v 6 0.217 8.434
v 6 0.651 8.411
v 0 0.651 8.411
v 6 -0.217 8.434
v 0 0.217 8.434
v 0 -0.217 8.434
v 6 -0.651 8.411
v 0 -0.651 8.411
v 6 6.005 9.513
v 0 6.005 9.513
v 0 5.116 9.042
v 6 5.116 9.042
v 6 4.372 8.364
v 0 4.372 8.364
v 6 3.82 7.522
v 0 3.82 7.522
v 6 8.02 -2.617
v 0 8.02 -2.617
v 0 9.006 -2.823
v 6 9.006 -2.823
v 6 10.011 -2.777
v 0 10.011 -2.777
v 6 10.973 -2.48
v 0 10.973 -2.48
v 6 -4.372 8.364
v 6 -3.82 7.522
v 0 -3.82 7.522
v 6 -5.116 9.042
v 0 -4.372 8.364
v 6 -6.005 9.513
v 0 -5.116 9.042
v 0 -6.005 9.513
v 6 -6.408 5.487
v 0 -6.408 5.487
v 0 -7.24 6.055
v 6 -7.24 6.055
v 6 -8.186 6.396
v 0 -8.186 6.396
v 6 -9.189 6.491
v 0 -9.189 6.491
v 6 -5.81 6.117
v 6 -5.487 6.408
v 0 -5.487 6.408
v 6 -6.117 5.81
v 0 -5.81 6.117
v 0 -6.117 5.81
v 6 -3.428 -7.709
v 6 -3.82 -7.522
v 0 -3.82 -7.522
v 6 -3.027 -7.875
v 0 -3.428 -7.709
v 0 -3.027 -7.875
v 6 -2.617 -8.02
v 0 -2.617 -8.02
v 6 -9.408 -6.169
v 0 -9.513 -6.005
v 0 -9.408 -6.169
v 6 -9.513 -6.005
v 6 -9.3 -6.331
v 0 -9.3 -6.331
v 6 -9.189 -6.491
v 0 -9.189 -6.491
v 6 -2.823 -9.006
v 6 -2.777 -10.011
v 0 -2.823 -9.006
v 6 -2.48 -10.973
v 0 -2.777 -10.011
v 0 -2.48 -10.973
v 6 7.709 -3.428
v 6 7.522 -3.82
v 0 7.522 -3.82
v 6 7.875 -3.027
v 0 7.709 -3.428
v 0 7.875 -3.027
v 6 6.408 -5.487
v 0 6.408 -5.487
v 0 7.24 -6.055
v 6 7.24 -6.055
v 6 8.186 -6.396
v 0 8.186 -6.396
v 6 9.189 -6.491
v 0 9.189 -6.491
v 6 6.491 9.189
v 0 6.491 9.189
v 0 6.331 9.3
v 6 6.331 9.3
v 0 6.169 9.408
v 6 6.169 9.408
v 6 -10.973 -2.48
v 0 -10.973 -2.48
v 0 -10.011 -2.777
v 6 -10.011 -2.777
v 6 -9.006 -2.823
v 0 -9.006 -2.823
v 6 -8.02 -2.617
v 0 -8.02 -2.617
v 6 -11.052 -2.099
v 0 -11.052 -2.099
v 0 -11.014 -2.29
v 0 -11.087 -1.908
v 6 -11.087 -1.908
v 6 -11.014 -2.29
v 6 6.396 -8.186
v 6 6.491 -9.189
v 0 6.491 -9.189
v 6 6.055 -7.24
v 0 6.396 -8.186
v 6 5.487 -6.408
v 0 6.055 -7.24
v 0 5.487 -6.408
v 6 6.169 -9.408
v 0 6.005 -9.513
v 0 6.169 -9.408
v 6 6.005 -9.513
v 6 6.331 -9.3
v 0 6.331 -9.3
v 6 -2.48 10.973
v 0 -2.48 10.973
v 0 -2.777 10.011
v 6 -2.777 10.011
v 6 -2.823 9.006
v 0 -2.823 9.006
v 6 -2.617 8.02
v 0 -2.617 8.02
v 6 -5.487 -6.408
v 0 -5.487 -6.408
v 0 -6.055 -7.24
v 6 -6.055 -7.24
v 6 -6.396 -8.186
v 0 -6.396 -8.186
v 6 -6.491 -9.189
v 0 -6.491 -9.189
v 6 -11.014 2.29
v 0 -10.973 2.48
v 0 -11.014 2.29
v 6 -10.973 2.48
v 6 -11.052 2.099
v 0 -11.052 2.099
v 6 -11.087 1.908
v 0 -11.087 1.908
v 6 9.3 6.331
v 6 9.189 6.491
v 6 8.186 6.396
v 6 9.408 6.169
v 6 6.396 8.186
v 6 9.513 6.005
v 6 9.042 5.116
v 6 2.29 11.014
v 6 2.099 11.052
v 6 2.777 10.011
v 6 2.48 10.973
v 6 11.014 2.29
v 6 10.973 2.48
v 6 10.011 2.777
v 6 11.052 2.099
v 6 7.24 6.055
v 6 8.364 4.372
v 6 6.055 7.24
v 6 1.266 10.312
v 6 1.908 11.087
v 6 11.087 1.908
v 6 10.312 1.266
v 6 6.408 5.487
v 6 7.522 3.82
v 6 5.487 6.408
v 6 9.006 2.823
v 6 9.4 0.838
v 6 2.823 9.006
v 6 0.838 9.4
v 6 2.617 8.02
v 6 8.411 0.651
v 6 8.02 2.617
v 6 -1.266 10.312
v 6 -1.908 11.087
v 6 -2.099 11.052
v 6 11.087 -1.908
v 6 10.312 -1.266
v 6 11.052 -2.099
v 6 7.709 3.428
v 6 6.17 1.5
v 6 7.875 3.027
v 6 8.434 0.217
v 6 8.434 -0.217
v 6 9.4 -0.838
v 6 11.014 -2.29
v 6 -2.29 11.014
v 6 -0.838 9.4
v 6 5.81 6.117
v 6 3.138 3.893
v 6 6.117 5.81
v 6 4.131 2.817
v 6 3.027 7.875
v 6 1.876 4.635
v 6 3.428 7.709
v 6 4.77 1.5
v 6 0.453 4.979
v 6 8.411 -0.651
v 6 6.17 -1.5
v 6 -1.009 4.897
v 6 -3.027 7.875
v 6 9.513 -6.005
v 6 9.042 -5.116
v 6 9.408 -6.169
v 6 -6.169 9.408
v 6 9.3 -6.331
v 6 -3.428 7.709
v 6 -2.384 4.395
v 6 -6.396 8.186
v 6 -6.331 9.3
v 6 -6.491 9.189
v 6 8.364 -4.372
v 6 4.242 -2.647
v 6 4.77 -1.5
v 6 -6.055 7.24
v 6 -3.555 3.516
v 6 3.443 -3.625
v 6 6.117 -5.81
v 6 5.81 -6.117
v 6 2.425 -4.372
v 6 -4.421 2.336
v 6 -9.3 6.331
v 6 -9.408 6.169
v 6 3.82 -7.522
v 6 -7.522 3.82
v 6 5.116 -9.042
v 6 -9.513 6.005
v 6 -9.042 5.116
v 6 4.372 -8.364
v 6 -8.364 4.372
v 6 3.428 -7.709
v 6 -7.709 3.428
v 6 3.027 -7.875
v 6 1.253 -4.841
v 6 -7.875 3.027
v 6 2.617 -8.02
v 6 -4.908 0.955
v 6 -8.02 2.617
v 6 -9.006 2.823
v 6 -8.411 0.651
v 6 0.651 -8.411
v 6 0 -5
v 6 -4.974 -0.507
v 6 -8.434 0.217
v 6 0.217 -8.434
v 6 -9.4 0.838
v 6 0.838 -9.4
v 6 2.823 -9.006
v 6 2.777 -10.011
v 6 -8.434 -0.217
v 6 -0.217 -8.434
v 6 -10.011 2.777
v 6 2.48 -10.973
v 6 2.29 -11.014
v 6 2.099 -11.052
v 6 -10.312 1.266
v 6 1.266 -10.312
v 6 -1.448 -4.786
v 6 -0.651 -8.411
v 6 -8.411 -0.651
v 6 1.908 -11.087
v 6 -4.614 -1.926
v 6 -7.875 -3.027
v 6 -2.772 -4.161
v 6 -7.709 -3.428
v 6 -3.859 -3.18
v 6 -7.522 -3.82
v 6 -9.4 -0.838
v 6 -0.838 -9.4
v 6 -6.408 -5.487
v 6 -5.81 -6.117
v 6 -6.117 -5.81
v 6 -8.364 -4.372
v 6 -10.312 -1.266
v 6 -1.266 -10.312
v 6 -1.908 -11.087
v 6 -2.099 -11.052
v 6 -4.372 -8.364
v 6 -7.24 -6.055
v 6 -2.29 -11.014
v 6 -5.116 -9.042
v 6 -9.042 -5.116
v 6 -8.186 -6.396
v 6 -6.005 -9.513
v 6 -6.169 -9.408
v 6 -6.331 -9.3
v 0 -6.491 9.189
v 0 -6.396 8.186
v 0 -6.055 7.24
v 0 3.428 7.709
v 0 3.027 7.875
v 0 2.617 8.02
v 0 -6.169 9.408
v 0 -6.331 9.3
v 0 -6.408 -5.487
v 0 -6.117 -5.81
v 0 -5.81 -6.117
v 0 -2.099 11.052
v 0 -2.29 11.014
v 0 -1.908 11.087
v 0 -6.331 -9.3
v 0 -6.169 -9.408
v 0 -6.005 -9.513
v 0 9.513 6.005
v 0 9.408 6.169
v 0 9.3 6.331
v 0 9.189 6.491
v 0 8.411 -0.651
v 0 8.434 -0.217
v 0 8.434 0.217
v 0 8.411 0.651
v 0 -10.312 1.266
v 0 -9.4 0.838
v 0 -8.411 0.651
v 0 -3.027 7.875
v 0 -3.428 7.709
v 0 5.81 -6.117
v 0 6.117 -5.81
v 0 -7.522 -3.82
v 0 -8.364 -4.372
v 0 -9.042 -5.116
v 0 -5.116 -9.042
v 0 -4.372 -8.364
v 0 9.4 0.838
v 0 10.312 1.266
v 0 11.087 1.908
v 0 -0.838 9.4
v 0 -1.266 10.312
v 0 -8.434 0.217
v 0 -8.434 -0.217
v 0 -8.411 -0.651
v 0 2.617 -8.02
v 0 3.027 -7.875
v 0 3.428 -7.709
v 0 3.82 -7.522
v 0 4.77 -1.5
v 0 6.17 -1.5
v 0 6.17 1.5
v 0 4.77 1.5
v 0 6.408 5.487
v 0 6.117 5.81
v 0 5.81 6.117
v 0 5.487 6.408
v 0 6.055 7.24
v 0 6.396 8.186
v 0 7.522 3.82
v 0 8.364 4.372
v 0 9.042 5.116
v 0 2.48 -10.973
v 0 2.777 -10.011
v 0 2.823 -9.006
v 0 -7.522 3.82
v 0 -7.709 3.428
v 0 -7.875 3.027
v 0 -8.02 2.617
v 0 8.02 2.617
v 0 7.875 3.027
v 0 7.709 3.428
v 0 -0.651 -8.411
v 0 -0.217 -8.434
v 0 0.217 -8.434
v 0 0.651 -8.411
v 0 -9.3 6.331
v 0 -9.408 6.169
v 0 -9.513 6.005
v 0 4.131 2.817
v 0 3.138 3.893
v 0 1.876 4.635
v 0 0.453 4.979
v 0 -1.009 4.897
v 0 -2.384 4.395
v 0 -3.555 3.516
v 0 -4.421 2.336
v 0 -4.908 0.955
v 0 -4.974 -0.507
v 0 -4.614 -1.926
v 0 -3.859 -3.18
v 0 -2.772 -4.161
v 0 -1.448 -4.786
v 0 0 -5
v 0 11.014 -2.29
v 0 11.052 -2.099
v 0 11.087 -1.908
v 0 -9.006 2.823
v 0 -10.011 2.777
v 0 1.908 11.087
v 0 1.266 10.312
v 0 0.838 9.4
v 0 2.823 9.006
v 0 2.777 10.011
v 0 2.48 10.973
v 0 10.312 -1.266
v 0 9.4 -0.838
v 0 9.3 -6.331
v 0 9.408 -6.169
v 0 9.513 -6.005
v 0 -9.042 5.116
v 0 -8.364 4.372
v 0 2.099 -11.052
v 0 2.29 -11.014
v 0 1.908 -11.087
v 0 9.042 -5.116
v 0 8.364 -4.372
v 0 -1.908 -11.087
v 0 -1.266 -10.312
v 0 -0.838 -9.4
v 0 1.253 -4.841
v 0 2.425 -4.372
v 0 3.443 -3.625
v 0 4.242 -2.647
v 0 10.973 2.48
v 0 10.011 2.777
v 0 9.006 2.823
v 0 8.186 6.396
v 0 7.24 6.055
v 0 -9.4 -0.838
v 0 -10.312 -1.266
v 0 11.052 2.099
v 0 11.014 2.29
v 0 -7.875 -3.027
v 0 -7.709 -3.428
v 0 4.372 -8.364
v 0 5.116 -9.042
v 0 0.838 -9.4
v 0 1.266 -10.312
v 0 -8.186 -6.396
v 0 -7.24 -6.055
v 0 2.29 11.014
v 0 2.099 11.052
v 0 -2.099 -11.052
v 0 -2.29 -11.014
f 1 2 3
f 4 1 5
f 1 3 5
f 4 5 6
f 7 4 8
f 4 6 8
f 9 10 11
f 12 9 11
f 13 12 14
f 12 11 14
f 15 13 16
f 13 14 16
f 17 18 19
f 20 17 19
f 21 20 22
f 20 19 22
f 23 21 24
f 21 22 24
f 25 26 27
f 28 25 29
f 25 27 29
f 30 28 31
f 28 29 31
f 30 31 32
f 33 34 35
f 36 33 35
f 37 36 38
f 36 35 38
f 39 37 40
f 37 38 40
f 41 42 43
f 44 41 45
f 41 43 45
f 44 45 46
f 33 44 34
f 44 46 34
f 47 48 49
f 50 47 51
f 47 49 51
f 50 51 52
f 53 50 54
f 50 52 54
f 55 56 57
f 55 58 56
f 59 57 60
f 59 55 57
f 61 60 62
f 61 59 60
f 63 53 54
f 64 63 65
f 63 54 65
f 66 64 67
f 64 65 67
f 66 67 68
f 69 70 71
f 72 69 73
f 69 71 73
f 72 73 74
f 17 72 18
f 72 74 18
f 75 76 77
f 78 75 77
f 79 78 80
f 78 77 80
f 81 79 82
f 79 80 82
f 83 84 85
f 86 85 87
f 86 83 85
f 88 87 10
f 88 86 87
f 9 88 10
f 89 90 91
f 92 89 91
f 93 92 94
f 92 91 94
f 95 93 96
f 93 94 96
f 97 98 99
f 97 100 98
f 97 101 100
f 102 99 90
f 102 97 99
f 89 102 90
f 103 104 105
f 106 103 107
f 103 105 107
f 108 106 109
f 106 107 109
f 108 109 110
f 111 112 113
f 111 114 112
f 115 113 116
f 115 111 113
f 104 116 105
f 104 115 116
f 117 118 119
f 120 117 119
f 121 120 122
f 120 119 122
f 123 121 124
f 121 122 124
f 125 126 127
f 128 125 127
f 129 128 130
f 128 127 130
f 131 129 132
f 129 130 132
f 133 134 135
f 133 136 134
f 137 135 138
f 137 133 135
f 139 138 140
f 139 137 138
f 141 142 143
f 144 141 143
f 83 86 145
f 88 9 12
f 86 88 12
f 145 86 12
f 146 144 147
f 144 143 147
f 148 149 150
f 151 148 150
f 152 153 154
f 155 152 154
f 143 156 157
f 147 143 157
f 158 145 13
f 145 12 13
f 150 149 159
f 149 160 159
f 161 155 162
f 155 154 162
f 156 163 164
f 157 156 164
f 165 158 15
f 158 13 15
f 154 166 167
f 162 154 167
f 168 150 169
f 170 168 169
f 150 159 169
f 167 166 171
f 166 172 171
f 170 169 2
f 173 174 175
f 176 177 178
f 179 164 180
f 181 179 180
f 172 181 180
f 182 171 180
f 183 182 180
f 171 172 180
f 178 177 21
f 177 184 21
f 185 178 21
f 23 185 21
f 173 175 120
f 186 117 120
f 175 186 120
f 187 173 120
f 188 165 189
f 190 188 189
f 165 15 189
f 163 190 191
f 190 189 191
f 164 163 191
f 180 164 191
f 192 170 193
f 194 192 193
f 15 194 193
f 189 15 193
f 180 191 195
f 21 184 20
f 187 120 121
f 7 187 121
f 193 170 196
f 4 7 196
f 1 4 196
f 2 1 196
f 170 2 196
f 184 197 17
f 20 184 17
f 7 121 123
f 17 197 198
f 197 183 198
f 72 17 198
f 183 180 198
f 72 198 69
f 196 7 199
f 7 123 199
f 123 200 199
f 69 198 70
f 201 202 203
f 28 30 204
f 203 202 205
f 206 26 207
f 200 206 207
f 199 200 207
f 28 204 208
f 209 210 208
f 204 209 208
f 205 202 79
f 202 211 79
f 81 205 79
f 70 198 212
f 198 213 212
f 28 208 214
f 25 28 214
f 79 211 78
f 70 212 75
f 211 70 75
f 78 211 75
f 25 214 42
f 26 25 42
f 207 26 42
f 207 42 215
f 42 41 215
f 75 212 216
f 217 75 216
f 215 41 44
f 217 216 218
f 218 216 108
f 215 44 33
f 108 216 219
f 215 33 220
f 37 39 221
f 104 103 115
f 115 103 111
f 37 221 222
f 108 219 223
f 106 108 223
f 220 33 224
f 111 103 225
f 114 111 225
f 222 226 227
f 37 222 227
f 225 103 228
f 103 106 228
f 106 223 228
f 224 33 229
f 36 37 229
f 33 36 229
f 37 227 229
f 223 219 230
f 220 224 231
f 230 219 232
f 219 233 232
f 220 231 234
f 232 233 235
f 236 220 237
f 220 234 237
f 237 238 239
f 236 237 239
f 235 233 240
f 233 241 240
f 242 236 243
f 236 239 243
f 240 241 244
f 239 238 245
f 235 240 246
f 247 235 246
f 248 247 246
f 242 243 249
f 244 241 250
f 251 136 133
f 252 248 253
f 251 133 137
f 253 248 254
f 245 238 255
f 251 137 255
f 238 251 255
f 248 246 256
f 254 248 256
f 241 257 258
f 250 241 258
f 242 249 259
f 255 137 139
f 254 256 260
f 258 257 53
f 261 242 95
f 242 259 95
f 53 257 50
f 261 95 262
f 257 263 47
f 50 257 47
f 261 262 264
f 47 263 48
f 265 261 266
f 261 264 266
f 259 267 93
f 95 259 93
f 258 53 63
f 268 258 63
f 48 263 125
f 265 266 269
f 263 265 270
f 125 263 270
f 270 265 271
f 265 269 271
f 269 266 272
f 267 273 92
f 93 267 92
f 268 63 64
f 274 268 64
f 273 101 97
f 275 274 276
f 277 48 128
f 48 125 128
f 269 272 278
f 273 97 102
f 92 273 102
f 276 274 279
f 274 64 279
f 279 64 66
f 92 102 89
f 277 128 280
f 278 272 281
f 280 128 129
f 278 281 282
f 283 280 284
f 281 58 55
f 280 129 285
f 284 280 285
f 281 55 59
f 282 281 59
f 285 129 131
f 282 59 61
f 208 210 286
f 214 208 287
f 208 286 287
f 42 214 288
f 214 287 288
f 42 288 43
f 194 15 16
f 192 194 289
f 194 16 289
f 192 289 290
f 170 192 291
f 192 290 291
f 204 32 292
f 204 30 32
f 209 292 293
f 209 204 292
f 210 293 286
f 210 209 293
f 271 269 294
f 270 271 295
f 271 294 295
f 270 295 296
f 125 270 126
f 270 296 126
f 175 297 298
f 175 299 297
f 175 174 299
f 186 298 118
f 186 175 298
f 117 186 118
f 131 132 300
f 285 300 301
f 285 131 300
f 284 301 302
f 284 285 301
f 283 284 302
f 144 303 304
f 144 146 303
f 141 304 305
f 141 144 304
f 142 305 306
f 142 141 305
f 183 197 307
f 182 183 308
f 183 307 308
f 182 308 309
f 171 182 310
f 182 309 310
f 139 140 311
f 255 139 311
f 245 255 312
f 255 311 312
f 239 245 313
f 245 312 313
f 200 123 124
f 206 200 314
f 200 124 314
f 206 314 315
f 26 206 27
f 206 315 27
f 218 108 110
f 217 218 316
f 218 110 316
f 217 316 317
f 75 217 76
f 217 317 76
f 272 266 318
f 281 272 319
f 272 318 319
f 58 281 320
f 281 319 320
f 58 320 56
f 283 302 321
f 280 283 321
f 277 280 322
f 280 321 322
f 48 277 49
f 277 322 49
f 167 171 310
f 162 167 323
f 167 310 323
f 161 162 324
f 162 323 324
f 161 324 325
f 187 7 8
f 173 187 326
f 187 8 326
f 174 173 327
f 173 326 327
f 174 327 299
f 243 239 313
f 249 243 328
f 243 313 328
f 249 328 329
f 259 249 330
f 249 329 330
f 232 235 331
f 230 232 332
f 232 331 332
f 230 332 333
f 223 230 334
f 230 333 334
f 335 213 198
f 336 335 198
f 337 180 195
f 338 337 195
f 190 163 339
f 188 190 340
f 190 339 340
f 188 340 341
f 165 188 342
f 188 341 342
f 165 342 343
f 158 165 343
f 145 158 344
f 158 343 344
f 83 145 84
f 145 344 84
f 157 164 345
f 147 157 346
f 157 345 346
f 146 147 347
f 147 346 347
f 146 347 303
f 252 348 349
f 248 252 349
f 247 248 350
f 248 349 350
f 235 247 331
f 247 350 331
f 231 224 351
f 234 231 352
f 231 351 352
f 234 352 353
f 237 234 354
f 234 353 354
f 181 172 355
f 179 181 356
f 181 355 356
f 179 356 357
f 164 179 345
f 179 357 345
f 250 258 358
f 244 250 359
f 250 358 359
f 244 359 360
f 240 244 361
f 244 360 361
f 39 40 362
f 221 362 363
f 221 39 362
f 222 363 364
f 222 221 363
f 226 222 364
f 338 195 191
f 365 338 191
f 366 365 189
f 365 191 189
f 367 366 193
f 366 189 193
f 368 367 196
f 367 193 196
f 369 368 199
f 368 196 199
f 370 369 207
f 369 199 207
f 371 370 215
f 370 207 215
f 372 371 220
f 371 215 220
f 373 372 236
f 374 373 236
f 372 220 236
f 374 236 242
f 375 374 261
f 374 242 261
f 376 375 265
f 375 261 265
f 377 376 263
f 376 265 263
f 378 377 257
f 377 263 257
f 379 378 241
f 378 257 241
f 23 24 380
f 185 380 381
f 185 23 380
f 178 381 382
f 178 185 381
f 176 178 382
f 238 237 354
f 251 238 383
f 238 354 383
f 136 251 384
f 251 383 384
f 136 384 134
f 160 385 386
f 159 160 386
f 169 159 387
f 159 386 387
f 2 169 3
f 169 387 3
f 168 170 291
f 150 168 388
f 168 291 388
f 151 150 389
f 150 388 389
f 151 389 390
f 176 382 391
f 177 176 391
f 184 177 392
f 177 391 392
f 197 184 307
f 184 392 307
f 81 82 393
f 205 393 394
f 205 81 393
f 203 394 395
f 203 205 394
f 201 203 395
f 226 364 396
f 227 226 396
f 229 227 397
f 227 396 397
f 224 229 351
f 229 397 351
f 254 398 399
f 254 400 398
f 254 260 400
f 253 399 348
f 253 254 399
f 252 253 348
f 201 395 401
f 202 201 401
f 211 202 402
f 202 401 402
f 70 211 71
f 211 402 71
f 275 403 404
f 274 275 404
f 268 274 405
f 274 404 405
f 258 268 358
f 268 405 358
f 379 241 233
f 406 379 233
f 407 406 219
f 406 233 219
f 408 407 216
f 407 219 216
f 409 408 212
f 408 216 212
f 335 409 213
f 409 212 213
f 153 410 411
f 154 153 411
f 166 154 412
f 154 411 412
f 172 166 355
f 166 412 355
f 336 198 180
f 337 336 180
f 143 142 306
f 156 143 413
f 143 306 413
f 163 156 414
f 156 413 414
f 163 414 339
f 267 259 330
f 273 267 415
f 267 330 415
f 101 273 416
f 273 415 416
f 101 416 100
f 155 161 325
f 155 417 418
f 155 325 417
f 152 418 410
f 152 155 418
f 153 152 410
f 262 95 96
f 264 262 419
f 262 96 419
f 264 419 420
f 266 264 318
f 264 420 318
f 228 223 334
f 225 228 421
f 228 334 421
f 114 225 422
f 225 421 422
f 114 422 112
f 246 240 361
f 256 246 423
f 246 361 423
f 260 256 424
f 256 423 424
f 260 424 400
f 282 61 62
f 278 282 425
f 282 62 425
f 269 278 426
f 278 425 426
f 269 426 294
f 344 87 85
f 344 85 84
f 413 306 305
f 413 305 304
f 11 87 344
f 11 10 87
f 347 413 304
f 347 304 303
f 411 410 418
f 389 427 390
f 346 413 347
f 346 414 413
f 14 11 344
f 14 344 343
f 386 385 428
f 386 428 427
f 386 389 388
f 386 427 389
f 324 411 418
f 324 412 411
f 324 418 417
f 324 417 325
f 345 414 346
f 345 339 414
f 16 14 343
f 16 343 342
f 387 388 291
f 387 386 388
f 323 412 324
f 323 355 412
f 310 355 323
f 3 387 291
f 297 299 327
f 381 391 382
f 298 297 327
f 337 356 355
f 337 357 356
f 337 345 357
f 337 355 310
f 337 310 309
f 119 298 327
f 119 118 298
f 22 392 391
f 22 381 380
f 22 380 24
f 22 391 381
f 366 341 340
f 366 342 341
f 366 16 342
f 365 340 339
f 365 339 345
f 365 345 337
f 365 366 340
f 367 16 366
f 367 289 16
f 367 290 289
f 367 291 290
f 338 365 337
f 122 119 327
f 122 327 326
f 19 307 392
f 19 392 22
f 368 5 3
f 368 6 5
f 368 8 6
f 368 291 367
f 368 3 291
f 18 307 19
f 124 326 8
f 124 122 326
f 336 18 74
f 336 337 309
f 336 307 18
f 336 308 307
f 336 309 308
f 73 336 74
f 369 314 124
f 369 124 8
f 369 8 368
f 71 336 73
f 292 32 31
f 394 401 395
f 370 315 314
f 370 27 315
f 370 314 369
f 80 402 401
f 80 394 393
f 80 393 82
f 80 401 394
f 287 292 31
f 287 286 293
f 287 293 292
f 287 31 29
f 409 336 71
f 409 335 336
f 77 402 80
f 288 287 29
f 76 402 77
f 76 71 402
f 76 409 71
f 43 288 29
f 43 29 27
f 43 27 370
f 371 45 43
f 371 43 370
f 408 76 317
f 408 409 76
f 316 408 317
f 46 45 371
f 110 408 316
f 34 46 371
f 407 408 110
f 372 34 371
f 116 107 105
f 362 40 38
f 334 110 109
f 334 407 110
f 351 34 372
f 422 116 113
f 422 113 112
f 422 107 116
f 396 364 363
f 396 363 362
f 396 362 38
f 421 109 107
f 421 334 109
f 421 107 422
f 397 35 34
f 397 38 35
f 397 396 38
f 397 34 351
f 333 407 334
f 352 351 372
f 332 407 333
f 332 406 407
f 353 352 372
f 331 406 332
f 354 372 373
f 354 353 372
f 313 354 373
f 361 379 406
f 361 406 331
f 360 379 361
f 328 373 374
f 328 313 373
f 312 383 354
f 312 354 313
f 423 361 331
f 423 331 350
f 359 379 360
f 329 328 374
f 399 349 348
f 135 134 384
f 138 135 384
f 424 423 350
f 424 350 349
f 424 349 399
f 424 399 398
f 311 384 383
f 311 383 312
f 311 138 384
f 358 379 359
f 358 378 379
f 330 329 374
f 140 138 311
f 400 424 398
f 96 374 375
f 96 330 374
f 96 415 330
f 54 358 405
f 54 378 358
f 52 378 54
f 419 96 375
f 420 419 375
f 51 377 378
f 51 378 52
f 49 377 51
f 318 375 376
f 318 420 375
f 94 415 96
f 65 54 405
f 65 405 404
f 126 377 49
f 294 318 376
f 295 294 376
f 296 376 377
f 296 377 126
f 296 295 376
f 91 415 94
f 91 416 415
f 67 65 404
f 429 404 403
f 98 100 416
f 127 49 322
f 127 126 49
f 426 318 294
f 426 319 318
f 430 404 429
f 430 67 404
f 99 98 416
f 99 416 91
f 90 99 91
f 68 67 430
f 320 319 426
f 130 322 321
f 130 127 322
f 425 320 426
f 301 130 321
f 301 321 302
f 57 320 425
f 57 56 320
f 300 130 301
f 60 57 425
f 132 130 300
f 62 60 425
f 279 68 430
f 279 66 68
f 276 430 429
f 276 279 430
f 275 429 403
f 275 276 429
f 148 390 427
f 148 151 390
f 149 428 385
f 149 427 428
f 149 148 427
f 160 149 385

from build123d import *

# Parameters (mm, degrees)
BASPROSKE_W              = 6
BASPROSKE_H              = 11.25
TOOTHCUT_DEPTH           = 18.003676073
TEETHCUTS_COUNT          = 16
TEETHCUTS_ANGLE          = 337.5
BORSKE_R                 = 0.4
BORE_DEPTH               = 50.0000508
TAGLIO_ESTRUSIONE1_DEPTH = 10


with BuildPart() as part:
    # BasProSke → Base-Revolve (revolve)
    with BuildSketch(Plane(origin=(0, 0, 0), x_dir=(1, 0, 0), z_dir=(0, 1, 0)), mode=Mode.PRIVATE) as base_revolve_sk:
        with Locations((3, 5.625)):
            Rectangle(BASPROSKE_W, BASPROSKE_H)
    revolve(base_revolve_sk.sketch.rotate(Axis((-10, 0, 0), (1, 0, 0)), 180), axis=Axis((-10, 0, 0), (1, 0, 0)))

    # TooCutSke → ToothCut (cut, through all)
    with BuildSketch(Plane(origin=(0, 0, 0), x_dir=(0, 0, -1), z_dir=(1, 0, 0))):
        with BuildLine():
            ThreePointArc((0.651061533, 8.411340626), (0, 8.4365), (-0.651061533, 8.411340626))
            ThreePointArc((-0.651061533, 8.411340626), (-1.029874156, 9.883978829), (-1.930926138, 11.108832945))
            ThreePointArc((-1.930926138, 11.108832945), (0, 11.2754), (1.930926138, 11.108832945))
            ThreePointArc((1.930926138, 11.108832945), (1.029874156, 9.883978829), (0.651061533, 8.411340626))
        make_face()
    toothcut = extrude(amount=TOOTHCUT_DEPTH, mode=Mode.SUBTRACT)

    # TeethCuts: ToothCut ×16 about axis
    teethcuts_axis = Axis((-10, 0, 0), (1, 0, 0))
    for i in range(1, TEETHCUTS_COUNT):
        add(toothcut.rotate(teethcuts_axis, i * TEETHCUTS_ANGLE / (TEETHCUTS_COUNT - 1)), mode=Mode.SUBTRACT)

    # BorSke → Bore (cut, symmetric)
    with BuildSketch(Plane(origin=(0, 0, 0), x_dir=(0, 0, -1), z_dir=(1, 0, 0))):
        with Locations(Location((0, 0, 0), (0, 0, 180))):
            Circle(BORSKE_R)
    extrude(amount=BORE_DEPTH, both=True, mode=Mode.SUBTRACT)

    # Schizzo1 → Taglio-Estrusione1 (cut)
    # profile 1 of 3: a face of its own
    with BuildSketch(Plane(origin=(6, 0, 0), x_dir=(0, 0, -1), z_dir=(1, 0, 0))):
        with BuildLine():
            ThreePointArc((1.5, 4.769696007), (0.758788496, 4.942088629), (0, 5))
            ThreePointArc((0, 5), (-0.758788496, 4.942088629), (-1.5, 4.769696007))
            ThreePointArc((-1.5, 4.769696007), (-2.958039892, -4.031128874), (5, 0))
            ThreePointArc((5, 0), (4.031128874, 2.958039892), (1.5, 4.769696007))
        make_face()
        with BuildLine():
            ThreePointArc((0.4, 0), (-0.282842712, -0.282842712), (0, 0.4))
            ThreePointArc((0, 0.4), (0.282842712, 0.282842712), (0.4, 0))
        make_face(mode=Mode.SUBTRACT)
    # profile 2 of 3: a face of its own
    with BuildSketch(Plane(origin=(6, 0, 0), x_dir=(0, 0, -1), z_dir=(1, 0, 0))):
        with BuildLine():
            ThreePointArc((-1.5, 4.769696007), (-0.758788496, 4.942088629), (0, 5))
            Line((0, 5), (0, 6.169696007))
            Line((0, 6.169696007), (-1.5, 6.169696007))
            Line((-1.5, 6.169696007), (-1.5, 4.769696007))
        make_face()
    # profile 3 of 3: a face of its own
    with BuildSketch(Plane(origin=(6, 0, 0), x_dir=(0, 0, -1), z_dir=(1, 0, 0))):
        with BuildLine():
            Line((0, 6.169696007), (0, 5))
            ThreePointArc((0, 5), (0.758788496, 4.942088629), (1.5, 4.769696007))
            Line((1.5, 4.769696007), (1.5, 6.169696007))
            Line((1.5, 6.169696007), (0, 6.169696007))
        make_face()
    extrude(amount=-TAGLIO_ESTRUSIONE1_DEPTH, mode=Mode.SUBTRACT)


solid = part.part
